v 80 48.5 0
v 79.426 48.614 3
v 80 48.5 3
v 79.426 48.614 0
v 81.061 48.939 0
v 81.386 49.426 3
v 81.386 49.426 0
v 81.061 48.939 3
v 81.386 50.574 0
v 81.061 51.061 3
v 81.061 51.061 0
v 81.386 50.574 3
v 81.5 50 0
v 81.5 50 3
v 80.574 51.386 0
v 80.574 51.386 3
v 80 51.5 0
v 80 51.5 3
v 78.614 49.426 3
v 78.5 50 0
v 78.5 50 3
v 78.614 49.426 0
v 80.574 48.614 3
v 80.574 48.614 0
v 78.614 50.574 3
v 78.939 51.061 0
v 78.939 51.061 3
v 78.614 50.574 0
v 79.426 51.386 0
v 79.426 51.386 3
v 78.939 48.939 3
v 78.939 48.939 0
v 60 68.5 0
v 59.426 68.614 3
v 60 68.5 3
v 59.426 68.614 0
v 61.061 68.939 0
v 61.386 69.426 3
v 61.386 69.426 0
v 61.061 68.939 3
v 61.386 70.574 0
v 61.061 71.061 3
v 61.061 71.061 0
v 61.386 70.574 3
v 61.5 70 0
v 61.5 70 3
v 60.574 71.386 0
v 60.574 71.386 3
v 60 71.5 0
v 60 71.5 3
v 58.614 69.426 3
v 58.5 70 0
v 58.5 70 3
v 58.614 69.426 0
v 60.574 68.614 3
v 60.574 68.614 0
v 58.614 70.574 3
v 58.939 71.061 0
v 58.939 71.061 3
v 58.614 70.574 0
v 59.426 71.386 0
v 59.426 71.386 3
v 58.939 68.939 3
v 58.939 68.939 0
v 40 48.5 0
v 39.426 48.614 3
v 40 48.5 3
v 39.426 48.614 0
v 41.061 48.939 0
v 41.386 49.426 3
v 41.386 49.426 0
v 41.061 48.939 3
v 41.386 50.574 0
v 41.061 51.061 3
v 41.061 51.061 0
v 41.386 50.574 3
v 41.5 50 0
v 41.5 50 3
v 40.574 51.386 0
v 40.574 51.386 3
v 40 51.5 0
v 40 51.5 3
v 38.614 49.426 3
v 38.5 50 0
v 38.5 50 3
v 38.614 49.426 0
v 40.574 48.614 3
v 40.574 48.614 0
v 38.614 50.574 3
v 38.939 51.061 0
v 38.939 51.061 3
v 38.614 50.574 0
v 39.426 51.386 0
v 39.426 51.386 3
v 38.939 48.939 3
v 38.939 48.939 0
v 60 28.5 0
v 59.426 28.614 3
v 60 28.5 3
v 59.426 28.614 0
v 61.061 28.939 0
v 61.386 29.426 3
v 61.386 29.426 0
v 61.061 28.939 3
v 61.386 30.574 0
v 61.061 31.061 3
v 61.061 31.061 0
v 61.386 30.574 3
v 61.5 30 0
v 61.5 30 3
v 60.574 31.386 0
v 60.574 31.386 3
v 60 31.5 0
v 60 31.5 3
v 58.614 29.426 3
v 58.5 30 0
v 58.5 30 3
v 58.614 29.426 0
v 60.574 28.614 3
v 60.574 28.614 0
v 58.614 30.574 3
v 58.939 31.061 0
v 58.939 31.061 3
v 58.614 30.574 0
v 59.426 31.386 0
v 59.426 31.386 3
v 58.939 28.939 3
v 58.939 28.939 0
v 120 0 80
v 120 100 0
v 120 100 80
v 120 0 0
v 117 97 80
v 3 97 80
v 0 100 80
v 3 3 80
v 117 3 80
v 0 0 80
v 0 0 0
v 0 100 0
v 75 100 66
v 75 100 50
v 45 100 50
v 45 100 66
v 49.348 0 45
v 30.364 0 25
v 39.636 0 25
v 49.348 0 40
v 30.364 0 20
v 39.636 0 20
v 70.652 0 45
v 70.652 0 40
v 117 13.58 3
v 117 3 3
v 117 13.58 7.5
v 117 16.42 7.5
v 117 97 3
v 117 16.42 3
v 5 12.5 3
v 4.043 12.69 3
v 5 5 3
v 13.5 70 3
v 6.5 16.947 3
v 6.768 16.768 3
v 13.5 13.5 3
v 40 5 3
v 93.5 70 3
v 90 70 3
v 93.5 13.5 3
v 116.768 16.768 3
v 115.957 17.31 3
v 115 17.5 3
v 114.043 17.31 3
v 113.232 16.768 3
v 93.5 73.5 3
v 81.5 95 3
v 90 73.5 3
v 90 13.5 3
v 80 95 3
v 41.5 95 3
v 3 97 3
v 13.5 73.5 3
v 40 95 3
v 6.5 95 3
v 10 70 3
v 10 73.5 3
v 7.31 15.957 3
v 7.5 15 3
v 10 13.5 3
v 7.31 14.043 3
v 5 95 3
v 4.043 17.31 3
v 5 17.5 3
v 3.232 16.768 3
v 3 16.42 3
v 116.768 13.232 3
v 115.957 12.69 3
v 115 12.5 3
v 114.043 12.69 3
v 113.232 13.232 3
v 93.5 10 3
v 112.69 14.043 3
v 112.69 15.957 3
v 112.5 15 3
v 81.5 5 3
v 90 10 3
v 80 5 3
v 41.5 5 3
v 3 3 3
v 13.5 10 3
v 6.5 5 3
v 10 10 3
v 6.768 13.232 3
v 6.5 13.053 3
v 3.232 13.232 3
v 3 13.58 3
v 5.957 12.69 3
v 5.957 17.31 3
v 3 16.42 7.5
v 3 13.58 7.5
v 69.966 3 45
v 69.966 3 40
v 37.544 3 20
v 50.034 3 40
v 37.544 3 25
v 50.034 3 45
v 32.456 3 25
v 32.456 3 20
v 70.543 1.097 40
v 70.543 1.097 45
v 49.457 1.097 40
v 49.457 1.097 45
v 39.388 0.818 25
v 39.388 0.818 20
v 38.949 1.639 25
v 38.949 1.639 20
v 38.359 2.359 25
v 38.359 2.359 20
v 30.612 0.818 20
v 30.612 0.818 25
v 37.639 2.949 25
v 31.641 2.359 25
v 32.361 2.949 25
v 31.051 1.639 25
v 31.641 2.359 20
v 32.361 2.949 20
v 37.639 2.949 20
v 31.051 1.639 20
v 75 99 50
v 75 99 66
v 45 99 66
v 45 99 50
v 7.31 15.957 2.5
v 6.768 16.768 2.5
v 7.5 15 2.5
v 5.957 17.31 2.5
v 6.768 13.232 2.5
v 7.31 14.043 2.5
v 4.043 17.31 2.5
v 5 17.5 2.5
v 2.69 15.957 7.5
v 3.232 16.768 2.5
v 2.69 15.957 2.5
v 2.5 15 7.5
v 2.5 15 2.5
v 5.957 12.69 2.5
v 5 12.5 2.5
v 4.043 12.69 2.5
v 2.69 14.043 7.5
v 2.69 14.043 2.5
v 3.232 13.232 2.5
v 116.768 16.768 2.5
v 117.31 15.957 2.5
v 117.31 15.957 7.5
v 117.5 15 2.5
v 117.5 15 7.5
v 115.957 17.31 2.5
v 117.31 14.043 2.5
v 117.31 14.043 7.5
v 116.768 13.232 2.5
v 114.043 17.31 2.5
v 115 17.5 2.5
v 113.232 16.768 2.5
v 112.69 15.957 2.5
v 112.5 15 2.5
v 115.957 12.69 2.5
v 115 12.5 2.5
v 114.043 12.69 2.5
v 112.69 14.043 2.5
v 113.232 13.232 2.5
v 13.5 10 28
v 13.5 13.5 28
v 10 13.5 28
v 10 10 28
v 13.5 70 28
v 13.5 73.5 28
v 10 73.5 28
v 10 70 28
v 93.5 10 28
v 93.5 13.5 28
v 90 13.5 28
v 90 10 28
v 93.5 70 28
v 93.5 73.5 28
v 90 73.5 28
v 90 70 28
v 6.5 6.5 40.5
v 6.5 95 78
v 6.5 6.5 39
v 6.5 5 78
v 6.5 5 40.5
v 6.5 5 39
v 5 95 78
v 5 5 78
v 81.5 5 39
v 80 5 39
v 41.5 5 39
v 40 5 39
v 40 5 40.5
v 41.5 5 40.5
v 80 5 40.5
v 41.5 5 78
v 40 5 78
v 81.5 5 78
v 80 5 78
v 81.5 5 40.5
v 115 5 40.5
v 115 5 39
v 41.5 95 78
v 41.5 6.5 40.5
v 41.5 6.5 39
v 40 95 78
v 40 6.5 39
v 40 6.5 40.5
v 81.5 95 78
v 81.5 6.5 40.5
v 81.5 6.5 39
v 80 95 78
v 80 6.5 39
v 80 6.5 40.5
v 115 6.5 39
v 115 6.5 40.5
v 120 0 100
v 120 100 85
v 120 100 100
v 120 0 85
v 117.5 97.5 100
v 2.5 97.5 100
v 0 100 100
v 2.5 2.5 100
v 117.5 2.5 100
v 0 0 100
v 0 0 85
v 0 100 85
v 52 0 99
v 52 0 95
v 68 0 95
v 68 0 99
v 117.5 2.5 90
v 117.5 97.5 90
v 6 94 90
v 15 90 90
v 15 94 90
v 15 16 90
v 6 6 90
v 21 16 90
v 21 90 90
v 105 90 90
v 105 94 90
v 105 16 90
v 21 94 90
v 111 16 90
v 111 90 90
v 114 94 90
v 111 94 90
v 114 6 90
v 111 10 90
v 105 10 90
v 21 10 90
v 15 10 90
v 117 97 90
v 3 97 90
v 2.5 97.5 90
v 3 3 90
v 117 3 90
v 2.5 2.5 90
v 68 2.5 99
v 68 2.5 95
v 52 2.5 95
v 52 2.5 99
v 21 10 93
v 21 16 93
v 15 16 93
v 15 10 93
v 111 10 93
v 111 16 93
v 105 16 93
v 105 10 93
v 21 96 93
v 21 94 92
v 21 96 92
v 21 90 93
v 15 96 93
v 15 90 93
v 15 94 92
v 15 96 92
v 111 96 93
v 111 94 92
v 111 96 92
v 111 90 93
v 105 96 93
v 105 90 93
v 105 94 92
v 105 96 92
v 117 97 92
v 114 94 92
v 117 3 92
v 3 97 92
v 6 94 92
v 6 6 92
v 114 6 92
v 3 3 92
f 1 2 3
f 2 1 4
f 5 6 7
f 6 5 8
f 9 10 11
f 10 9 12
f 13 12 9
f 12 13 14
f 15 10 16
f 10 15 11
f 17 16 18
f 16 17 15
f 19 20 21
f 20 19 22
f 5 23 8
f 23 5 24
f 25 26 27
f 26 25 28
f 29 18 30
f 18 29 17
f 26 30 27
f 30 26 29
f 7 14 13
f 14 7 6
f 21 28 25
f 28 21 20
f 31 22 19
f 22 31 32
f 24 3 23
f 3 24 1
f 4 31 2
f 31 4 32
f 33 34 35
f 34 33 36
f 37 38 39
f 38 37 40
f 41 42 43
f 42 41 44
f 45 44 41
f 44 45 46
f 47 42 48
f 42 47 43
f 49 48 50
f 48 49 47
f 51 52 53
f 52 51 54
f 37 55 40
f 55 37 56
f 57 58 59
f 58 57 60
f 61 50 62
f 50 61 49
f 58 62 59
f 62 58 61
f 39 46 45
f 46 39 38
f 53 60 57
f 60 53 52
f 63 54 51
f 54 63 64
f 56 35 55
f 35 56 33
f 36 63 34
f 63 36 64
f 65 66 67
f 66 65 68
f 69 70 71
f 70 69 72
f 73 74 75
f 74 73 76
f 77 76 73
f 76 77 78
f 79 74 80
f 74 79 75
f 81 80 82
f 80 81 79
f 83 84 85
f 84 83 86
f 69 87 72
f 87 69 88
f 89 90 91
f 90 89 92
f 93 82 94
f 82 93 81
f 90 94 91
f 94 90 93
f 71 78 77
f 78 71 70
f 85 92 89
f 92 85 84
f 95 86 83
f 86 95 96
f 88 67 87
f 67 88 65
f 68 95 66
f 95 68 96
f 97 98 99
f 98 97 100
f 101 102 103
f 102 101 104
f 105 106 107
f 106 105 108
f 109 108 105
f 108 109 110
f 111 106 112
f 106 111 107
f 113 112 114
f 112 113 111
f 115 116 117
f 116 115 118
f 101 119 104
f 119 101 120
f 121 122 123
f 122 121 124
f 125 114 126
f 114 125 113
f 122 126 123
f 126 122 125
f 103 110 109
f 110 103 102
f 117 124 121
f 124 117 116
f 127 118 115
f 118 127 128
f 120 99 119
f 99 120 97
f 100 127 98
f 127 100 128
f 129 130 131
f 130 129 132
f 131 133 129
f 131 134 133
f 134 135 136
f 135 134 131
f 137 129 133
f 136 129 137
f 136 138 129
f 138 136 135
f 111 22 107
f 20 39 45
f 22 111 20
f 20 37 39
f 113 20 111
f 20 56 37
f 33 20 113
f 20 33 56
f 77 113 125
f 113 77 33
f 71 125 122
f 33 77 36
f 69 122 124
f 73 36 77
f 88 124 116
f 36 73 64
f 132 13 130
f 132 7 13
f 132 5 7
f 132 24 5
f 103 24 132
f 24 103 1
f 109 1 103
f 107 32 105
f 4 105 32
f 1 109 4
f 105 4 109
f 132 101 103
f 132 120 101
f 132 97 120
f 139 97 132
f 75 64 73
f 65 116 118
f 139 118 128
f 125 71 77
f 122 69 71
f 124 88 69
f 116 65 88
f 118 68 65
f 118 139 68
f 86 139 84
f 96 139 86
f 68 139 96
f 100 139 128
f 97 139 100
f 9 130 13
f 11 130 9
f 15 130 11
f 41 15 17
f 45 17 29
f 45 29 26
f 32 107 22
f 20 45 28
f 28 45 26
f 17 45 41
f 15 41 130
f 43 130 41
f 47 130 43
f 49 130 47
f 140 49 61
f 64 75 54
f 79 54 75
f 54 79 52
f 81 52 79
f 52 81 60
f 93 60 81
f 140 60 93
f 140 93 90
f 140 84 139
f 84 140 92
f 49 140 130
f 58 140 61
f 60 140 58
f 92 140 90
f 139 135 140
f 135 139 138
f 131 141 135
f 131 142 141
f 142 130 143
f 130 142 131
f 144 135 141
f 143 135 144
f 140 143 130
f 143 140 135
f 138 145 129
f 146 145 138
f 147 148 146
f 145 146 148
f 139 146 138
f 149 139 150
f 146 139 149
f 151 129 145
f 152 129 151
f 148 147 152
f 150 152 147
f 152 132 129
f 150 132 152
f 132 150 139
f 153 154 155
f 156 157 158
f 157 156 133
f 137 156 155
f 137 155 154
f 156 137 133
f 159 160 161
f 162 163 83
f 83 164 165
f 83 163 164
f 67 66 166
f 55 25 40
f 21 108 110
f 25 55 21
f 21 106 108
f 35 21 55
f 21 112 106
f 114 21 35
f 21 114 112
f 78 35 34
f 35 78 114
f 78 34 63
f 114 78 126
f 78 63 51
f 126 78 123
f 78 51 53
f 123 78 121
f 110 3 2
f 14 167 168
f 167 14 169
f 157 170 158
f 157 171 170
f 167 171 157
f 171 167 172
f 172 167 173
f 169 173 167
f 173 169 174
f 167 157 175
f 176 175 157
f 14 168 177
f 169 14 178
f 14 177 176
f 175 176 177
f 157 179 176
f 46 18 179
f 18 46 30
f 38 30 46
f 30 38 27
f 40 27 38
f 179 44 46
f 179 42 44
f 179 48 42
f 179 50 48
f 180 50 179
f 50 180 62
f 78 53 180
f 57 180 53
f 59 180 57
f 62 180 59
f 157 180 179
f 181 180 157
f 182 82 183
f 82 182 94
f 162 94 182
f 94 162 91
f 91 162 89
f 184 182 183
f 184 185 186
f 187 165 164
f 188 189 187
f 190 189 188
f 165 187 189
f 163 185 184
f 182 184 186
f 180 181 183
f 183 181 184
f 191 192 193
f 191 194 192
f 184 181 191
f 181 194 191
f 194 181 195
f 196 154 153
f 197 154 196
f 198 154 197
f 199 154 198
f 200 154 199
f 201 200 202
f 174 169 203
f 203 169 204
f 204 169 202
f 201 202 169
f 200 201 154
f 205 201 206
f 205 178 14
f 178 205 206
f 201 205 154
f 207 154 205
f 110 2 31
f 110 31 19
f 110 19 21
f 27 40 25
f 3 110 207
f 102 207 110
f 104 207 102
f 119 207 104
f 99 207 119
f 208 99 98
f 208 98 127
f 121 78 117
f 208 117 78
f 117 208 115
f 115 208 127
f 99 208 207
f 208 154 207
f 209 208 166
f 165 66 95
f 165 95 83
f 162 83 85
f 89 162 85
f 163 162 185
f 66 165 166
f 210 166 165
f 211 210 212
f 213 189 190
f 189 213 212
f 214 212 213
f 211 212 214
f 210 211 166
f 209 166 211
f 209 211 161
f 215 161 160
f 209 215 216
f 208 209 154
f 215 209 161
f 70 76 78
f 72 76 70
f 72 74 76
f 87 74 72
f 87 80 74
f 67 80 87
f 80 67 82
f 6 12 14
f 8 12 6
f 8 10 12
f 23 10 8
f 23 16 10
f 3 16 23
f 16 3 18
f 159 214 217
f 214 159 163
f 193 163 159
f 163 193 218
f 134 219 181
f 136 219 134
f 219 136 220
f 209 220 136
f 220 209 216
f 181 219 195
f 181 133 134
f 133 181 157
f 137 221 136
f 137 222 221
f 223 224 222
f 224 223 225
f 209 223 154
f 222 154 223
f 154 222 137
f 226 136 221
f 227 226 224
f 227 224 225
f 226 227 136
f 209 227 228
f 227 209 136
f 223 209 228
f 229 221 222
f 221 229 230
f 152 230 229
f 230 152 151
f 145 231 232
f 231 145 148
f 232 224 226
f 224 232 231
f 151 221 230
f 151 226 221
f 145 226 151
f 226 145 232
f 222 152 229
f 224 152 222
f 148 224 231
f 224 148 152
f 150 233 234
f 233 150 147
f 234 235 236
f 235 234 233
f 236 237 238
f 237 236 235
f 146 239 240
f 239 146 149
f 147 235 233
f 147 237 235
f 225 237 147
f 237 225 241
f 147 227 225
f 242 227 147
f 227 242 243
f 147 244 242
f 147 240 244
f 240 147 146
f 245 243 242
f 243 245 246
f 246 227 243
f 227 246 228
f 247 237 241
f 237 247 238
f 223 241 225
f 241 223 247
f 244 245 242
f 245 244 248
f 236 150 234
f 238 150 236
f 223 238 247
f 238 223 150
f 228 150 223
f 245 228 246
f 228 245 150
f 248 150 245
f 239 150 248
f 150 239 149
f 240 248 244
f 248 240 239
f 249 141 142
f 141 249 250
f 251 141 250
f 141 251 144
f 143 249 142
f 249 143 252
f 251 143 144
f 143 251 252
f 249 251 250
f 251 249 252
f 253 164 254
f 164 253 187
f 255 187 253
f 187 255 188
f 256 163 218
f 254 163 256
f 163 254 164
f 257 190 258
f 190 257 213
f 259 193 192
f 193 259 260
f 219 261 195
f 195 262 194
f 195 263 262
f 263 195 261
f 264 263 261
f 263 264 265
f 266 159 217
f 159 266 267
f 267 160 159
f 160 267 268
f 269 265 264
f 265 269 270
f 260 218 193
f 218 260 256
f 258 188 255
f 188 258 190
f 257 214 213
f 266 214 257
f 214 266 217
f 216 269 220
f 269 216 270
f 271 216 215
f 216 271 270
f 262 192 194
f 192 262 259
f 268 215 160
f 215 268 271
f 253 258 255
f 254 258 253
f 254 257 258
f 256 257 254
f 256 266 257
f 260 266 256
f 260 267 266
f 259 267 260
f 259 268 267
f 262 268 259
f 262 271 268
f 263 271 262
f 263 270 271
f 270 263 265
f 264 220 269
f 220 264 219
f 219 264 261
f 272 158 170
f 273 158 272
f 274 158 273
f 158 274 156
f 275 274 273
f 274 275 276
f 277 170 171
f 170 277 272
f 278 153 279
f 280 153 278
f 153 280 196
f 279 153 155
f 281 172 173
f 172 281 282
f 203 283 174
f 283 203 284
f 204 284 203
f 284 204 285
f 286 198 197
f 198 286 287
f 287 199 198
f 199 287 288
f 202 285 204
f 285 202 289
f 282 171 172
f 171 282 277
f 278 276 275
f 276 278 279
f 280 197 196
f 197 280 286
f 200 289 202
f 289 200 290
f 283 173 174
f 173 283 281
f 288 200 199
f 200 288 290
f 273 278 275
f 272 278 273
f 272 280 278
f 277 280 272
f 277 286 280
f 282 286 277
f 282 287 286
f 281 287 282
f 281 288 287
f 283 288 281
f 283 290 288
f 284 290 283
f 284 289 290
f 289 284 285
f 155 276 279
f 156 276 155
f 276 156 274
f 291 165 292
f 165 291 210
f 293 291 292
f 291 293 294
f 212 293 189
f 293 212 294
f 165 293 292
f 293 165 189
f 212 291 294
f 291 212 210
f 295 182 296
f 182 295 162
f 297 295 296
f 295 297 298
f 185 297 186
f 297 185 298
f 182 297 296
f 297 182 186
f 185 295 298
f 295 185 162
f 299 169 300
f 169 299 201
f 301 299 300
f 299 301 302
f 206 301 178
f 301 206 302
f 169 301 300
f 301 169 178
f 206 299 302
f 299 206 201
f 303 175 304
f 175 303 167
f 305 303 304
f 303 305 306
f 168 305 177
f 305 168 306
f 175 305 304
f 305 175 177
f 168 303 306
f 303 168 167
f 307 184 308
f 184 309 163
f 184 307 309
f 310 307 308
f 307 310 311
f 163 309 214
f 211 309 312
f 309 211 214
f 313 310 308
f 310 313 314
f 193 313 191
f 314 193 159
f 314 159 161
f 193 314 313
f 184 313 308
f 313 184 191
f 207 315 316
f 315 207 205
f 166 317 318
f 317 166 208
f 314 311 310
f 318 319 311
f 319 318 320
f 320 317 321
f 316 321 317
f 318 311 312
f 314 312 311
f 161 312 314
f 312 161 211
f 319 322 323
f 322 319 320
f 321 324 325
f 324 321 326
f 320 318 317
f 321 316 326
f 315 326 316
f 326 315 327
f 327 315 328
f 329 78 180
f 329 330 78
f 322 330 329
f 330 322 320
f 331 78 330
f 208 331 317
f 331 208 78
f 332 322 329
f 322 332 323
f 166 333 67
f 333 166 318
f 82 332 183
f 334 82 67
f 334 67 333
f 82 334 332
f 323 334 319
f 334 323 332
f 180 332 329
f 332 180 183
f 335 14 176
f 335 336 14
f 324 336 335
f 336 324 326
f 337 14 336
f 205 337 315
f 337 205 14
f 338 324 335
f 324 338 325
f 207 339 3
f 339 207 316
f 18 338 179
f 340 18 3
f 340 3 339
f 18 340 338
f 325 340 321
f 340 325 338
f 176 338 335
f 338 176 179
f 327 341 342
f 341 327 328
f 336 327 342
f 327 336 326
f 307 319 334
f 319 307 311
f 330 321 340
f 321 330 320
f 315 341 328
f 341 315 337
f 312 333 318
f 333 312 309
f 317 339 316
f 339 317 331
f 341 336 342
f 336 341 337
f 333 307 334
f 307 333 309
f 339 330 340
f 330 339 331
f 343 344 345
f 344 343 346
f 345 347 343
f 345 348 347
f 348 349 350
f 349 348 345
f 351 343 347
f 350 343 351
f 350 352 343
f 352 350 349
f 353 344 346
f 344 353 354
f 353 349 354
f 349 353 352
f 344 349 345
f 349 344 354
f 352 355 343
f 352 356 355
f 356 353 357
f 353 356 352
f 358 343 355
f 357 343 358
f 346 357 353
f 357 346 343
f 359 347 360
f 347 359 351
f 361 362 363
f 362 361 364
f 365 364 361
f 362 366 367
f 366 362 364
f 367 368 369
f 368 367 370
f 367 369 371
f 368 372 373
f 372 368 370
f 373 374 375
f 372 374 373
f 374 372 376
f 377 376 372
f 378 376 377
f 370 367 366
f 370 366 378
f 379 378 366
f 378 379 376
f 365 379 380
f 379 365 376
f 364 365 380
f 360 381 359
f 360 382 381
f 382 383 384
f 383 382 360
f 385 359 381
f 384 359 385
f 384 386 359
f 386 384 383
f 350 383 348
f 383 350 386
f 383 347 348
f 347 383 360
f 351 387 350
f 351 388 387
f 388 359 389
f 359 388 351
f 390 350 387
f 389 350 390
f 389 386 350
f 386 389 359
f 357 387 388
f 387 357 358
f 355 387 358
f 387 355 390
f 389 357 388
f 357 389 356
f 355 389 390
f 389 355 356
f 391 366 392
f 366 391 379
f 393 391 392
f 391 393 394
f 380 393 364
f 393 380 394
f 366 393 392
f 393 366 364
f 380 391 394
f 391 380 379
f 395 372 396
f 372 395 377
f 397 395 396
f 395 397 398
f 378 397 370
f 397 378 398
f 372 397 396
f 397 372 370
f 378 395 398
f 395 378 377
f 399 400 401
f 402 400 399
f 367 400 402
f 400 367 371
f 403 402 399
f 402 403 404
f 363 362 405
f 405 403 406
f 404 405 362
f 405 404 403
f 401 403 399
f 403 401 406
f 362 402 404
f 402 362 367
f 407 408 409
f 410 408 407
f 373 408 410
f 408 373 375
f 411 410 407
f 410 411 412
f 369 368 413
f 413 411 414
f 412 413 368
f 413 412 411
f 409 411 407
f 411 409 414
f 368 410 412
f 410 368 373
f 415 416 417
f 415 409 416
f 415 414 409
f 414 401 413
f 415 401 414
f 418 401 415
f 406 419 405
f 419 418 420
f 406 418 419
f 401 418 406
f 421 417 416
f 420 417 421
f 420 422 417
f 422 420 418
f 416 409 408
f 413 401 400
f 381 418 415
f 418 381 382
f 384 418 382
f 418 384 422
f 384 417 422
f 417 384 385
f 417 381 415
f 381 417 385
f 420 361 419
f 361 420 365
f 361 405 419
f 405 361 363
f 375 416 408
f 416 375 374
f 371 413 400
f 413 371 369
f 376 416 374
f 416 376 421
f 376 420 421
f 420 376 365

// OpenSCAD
// ============================================================================
// VHF/UHF REMOTE ELEMENT SWITCHING SYSTEM
// ELEMENT RELAY ENCLOSURE - IP66 WEATHER-SEALED BOX
// For mast-top mounting, relay PCB + driver circuitry protection
// ============================================================================
// Parameters (all dimensions in mm)
// Target print volume: 200x200x200mm (fits as-is)
// Material: PETG or ASA (weather-resistant)
// Supports 6M/2M relay switching or 70cm+ PIN diode networks
// ============================================================================

// ============== CONFIGURATION PARAMETERS ==============

// Box external dimensions
box_length = 120;      // X axis (element-parallel direction)
box_width = 100;       // Y axis (boom-parallel direction)
box_height = 80;       // Z axis (vertical when mounted)

// Wall thickness
wall = 3.0;            // 3mm walls for strength

// Connector dimensions
so239_hole_d = 21.5;   // SO-239 connector hole diameter
n_conn_d = 9.5;        // N-type connector hole diameter
db9_width = 30;        // DB9 mounting slot width
db9_height = 16;       // DB9 mounting slot height

// Screw holes for boom mounting
boom_mount_diam = 5.0; // M4 screw hole (5.0mm for clearance)
boom_mount_offset = 15; // offset from bottom

// O-ring groove parameters (lid sealing)
groove_width = 3.0;
groove_depth = 2.0;
groove_radius = 2.5;

// ============== MAIN BOX GEOMETRY ==============

module main_enclosure() {
  difference() {
    // Solid outer box
    cube([box_length, box_width, box_height], center=false);

    // Hollow interior
    translate([wall, wall, wall])
      cube([box_length - 2*wall,
            box_width - 2*wall,
            box_height - wall],  // top remains closed
           center=false);

    // SO-239 connector hole (element RF entry, front face)
    translate([box_length/2, -1, box_height/2])
      cylinder(d=so239_hole_d, h=wall+2, $fn=32);

    // N-type connector hole (boom RF return)
    translate([box_length/2 - 25, -1, 20])
      cylinder(d=n_conn_d, h=wall+2, $fn=32);

    // DB9 control connector slot (rear face)
    translate([box_length/2 - db9_width/2, box_width-1, box_height - 30])
      cube([db9_width, wall+2, db9_height], center=false);

    // Drainage holes (bottom, 4 small holes for water escape)
    for (i=[0:3]) {
      angle = i * 90;
      translate([box_length/2 + 20*cos(angle), box_width/2 + 20*sin(angle), -1])
        cylinder(d=3.0, h=wall+2, $fn=16);
    }

    // Boom mounting screw holes (left and right sides)
    translate([5, boom_mount_offset, boom_mount_diam/2])
      cylinder(d=boom_mount_diam, h=wall+2, $fn=16);
    translate([box_length-5, boom_mount_offset, boom_mount_diam/2])
      cylinder(d=boom_mount_diam, h=wall+2, $fn=16);
  }

  // Internal snap bosses for PCB mounting (3x3mm bosses at 4 corners)
  pcb_offset = 10;
  pcb_height = 25;
  boss_size = 3.5;
  for (x = [pcb_offset, box_length - pcb_offset - 20]) {
    for (y = [pcb_offset, box_width - pcb_offset - 20]) {
      translate([x, y, wall])
        cube([boss_size, boss_size, pcb_height], center=false);
    }
  }
}

// ============== LID GEOMETRY ==============

module lid() {
  difference() {
    // Outer lid dimensions
    cube([box_length, box_width, 15], center=false);

    // Interior recess (fits over box edge)
    translate([wall-0.5, wall-0.5, 5])
      cube([box_length - 2*(wall-0.5),
            box_width - 2*(wall-0.5),
            15],
           center=false);

    // Snap slot for closure (center, front edge)
    translate([box_length/2 - 8, -1, 10])
      cube([16, wall+2, 4], center=false);
  }

  // O-ring groove (top surface for sealing, internal edge)
  translate([wall, wall, 5])
    linear_extrude(height=groove_depth)
      difference() {
        square([box_length - 2*wall, box_width - 2*wall]);
        offset(-groove_width)
          square([box_length - 2*wall, box_width - 2*wall]);
      }

  // Snap bosses (4 positions to lock lid to box)
  snap_positions = [[15, 10, 0], [box_length-15, 10, 0],
                    [15, box_width-10, 0], [box_length-15, box_width-10, 0]];
  for (pos = snap_positions) {
    translate(pos)
      cube([6, 6, 8], center=false);
  }
}

// ============== INTERNAL STIFFENING ==============

module internal_ribs() {
  // Vertical ribs for structural support (prevent flex)
  // Rib 1: center length-wise
  translate([wall + 2, wall + 2, wall])
    cube([1.5, box_width - 2*wall - 4, box_height - wall - 2]);

  // Rib 2: 1/3 from edge
  translate([box_length/3, wall + 2, wall])
    cube([1.5, box_width - 2*wall - 4, box_height - wall - 2]);

  // Rib 3: 2/3 from edge
  translate([2*box_length/3, wall + 2, wall])
    cube([1.5, box_width - 2*wall - 4, box_height - wall - 2]);

  // Horizontal rib at mid-height
  translate([wall + 2, wall + 2, box_height/2 - 1])
    cube([box_length - 2*wall - 4, 1.5, 1.5]);
}

// ============== VENTILATION (Optional - for heat dissipation) ==============

module ventilation_slots() {
  // 4 horizontal slots on left side (for air circulation)
  slot_height = 2.0;
  slot_length = 15;

  for (i = [0:3]) {
    y_pos = 20 + i * 15;
    translate([-1, y_pos, box_height/2 + i*5 - 10])
      cube([wall + 2, slot_length, slot_height]);
  }

  // Matching slots on right side
  for (i = [0:3]) {
    y_pos = 20 + i * 15;
    translate([box_length - 1, y_pos, box_height/2 + i*5 - 10])
      cube([wall + 2, slot_length, slot_height]);
  }
}

// ============== CONNECTOR FACE PLATES ==============

module connector_panel() {
  // Optional: separate faceplate for connectors
  // Mounts to front of enclosure, holds SO-239, N-type, DB9

  difference() {
    // Base panel
    cube([40, 60, 8], center=false);

    // SO-239 hole (center top)
    translate([20, 40, -1])
      cylinder(d=so239_hole_d, h=10, $fn=32);

    // N-type hole (below SO-239)
    translate([20, 20, -1])
      cylinder(d=n_conn_d, h=10, $fn=32);
  }
}

// ============== CABLE GLANDS ==============

module cable_gland() {
  // M20 cable gland for control cable (rear of box)
  difference() {
    // Outer threaded part
    cylinder(d=22, h=20, $fn=24);

    // Interior hole for cable (8mm for standard shielded pair)
    cylinder(d=8, h=25, $fn=16);
  }
}

// ============== ASSEMBLY ==============

// Main enclosure body
main_enclosure();

// Internal stiffening ribs
internal_ribs();

// Lid (separate for assembly, comment out to print base only)
translate([0, 0, box_height + 5])
  lid();

// Optional ventilation (uncomment to enable)
// ventilation_slots();

// ============== PRINT INSTRUCTIONS ==============
/*
ASSEMBLY:
  1. Print enclosure and lid in PETG or ASA
  2. Clean all raft and support material
  3. Mount relay PCB on internal snap bosses (5mm height)
  4. Install SO-239, N-type, DB9 connectors in cutouts
  5. Route control cable through cable gland (rear)
  6. Place O-ring (3.2mm OD x 2.4mm ID) in groove
  7. Close lid with snap closures

MOUNTING:
  - Bolt to boom via M4 screw holes (left and right, 15mm from bottom)
  - Use Stainless steel hardware (304 or higher)
  - Orient SO-239 connector facing feed line
  - Control cable exits rear, route in conduit to mast

WEATHERPROOFING:
  - Apply silicone conformal coating to all PCB traces
  - Use dielectric grease on connector threads
  - Seal all screw holes with PTFE thread seal tape
  - Annual inspection: check O-ring for hardening

PRINT SETTINGS (PETG):
  - Nozzle: 240°C, Bed: 80°C
  - Layer height: 0.2mm
  - Infill: 15% (grid pattern)
  - Supports: Tree supports where needed
  - Print time: ~4-5 hours
  - Material: ~80g PETG filament
*/

// ============== PARAMETERS FOR PARAMETRIC ADJUSTMENTS ==============
// To modify dimensions, change these variables at the top
// Then export as STL for 3D printing
//
// Common modifications:
// - For larger relay PCBs: increase box_length to 140mm
// - For PIN diode circuits: keep default (more compact)
// - For dual-element control: increase box_width to 120mm
// - For external power supply: add 25mm to height
